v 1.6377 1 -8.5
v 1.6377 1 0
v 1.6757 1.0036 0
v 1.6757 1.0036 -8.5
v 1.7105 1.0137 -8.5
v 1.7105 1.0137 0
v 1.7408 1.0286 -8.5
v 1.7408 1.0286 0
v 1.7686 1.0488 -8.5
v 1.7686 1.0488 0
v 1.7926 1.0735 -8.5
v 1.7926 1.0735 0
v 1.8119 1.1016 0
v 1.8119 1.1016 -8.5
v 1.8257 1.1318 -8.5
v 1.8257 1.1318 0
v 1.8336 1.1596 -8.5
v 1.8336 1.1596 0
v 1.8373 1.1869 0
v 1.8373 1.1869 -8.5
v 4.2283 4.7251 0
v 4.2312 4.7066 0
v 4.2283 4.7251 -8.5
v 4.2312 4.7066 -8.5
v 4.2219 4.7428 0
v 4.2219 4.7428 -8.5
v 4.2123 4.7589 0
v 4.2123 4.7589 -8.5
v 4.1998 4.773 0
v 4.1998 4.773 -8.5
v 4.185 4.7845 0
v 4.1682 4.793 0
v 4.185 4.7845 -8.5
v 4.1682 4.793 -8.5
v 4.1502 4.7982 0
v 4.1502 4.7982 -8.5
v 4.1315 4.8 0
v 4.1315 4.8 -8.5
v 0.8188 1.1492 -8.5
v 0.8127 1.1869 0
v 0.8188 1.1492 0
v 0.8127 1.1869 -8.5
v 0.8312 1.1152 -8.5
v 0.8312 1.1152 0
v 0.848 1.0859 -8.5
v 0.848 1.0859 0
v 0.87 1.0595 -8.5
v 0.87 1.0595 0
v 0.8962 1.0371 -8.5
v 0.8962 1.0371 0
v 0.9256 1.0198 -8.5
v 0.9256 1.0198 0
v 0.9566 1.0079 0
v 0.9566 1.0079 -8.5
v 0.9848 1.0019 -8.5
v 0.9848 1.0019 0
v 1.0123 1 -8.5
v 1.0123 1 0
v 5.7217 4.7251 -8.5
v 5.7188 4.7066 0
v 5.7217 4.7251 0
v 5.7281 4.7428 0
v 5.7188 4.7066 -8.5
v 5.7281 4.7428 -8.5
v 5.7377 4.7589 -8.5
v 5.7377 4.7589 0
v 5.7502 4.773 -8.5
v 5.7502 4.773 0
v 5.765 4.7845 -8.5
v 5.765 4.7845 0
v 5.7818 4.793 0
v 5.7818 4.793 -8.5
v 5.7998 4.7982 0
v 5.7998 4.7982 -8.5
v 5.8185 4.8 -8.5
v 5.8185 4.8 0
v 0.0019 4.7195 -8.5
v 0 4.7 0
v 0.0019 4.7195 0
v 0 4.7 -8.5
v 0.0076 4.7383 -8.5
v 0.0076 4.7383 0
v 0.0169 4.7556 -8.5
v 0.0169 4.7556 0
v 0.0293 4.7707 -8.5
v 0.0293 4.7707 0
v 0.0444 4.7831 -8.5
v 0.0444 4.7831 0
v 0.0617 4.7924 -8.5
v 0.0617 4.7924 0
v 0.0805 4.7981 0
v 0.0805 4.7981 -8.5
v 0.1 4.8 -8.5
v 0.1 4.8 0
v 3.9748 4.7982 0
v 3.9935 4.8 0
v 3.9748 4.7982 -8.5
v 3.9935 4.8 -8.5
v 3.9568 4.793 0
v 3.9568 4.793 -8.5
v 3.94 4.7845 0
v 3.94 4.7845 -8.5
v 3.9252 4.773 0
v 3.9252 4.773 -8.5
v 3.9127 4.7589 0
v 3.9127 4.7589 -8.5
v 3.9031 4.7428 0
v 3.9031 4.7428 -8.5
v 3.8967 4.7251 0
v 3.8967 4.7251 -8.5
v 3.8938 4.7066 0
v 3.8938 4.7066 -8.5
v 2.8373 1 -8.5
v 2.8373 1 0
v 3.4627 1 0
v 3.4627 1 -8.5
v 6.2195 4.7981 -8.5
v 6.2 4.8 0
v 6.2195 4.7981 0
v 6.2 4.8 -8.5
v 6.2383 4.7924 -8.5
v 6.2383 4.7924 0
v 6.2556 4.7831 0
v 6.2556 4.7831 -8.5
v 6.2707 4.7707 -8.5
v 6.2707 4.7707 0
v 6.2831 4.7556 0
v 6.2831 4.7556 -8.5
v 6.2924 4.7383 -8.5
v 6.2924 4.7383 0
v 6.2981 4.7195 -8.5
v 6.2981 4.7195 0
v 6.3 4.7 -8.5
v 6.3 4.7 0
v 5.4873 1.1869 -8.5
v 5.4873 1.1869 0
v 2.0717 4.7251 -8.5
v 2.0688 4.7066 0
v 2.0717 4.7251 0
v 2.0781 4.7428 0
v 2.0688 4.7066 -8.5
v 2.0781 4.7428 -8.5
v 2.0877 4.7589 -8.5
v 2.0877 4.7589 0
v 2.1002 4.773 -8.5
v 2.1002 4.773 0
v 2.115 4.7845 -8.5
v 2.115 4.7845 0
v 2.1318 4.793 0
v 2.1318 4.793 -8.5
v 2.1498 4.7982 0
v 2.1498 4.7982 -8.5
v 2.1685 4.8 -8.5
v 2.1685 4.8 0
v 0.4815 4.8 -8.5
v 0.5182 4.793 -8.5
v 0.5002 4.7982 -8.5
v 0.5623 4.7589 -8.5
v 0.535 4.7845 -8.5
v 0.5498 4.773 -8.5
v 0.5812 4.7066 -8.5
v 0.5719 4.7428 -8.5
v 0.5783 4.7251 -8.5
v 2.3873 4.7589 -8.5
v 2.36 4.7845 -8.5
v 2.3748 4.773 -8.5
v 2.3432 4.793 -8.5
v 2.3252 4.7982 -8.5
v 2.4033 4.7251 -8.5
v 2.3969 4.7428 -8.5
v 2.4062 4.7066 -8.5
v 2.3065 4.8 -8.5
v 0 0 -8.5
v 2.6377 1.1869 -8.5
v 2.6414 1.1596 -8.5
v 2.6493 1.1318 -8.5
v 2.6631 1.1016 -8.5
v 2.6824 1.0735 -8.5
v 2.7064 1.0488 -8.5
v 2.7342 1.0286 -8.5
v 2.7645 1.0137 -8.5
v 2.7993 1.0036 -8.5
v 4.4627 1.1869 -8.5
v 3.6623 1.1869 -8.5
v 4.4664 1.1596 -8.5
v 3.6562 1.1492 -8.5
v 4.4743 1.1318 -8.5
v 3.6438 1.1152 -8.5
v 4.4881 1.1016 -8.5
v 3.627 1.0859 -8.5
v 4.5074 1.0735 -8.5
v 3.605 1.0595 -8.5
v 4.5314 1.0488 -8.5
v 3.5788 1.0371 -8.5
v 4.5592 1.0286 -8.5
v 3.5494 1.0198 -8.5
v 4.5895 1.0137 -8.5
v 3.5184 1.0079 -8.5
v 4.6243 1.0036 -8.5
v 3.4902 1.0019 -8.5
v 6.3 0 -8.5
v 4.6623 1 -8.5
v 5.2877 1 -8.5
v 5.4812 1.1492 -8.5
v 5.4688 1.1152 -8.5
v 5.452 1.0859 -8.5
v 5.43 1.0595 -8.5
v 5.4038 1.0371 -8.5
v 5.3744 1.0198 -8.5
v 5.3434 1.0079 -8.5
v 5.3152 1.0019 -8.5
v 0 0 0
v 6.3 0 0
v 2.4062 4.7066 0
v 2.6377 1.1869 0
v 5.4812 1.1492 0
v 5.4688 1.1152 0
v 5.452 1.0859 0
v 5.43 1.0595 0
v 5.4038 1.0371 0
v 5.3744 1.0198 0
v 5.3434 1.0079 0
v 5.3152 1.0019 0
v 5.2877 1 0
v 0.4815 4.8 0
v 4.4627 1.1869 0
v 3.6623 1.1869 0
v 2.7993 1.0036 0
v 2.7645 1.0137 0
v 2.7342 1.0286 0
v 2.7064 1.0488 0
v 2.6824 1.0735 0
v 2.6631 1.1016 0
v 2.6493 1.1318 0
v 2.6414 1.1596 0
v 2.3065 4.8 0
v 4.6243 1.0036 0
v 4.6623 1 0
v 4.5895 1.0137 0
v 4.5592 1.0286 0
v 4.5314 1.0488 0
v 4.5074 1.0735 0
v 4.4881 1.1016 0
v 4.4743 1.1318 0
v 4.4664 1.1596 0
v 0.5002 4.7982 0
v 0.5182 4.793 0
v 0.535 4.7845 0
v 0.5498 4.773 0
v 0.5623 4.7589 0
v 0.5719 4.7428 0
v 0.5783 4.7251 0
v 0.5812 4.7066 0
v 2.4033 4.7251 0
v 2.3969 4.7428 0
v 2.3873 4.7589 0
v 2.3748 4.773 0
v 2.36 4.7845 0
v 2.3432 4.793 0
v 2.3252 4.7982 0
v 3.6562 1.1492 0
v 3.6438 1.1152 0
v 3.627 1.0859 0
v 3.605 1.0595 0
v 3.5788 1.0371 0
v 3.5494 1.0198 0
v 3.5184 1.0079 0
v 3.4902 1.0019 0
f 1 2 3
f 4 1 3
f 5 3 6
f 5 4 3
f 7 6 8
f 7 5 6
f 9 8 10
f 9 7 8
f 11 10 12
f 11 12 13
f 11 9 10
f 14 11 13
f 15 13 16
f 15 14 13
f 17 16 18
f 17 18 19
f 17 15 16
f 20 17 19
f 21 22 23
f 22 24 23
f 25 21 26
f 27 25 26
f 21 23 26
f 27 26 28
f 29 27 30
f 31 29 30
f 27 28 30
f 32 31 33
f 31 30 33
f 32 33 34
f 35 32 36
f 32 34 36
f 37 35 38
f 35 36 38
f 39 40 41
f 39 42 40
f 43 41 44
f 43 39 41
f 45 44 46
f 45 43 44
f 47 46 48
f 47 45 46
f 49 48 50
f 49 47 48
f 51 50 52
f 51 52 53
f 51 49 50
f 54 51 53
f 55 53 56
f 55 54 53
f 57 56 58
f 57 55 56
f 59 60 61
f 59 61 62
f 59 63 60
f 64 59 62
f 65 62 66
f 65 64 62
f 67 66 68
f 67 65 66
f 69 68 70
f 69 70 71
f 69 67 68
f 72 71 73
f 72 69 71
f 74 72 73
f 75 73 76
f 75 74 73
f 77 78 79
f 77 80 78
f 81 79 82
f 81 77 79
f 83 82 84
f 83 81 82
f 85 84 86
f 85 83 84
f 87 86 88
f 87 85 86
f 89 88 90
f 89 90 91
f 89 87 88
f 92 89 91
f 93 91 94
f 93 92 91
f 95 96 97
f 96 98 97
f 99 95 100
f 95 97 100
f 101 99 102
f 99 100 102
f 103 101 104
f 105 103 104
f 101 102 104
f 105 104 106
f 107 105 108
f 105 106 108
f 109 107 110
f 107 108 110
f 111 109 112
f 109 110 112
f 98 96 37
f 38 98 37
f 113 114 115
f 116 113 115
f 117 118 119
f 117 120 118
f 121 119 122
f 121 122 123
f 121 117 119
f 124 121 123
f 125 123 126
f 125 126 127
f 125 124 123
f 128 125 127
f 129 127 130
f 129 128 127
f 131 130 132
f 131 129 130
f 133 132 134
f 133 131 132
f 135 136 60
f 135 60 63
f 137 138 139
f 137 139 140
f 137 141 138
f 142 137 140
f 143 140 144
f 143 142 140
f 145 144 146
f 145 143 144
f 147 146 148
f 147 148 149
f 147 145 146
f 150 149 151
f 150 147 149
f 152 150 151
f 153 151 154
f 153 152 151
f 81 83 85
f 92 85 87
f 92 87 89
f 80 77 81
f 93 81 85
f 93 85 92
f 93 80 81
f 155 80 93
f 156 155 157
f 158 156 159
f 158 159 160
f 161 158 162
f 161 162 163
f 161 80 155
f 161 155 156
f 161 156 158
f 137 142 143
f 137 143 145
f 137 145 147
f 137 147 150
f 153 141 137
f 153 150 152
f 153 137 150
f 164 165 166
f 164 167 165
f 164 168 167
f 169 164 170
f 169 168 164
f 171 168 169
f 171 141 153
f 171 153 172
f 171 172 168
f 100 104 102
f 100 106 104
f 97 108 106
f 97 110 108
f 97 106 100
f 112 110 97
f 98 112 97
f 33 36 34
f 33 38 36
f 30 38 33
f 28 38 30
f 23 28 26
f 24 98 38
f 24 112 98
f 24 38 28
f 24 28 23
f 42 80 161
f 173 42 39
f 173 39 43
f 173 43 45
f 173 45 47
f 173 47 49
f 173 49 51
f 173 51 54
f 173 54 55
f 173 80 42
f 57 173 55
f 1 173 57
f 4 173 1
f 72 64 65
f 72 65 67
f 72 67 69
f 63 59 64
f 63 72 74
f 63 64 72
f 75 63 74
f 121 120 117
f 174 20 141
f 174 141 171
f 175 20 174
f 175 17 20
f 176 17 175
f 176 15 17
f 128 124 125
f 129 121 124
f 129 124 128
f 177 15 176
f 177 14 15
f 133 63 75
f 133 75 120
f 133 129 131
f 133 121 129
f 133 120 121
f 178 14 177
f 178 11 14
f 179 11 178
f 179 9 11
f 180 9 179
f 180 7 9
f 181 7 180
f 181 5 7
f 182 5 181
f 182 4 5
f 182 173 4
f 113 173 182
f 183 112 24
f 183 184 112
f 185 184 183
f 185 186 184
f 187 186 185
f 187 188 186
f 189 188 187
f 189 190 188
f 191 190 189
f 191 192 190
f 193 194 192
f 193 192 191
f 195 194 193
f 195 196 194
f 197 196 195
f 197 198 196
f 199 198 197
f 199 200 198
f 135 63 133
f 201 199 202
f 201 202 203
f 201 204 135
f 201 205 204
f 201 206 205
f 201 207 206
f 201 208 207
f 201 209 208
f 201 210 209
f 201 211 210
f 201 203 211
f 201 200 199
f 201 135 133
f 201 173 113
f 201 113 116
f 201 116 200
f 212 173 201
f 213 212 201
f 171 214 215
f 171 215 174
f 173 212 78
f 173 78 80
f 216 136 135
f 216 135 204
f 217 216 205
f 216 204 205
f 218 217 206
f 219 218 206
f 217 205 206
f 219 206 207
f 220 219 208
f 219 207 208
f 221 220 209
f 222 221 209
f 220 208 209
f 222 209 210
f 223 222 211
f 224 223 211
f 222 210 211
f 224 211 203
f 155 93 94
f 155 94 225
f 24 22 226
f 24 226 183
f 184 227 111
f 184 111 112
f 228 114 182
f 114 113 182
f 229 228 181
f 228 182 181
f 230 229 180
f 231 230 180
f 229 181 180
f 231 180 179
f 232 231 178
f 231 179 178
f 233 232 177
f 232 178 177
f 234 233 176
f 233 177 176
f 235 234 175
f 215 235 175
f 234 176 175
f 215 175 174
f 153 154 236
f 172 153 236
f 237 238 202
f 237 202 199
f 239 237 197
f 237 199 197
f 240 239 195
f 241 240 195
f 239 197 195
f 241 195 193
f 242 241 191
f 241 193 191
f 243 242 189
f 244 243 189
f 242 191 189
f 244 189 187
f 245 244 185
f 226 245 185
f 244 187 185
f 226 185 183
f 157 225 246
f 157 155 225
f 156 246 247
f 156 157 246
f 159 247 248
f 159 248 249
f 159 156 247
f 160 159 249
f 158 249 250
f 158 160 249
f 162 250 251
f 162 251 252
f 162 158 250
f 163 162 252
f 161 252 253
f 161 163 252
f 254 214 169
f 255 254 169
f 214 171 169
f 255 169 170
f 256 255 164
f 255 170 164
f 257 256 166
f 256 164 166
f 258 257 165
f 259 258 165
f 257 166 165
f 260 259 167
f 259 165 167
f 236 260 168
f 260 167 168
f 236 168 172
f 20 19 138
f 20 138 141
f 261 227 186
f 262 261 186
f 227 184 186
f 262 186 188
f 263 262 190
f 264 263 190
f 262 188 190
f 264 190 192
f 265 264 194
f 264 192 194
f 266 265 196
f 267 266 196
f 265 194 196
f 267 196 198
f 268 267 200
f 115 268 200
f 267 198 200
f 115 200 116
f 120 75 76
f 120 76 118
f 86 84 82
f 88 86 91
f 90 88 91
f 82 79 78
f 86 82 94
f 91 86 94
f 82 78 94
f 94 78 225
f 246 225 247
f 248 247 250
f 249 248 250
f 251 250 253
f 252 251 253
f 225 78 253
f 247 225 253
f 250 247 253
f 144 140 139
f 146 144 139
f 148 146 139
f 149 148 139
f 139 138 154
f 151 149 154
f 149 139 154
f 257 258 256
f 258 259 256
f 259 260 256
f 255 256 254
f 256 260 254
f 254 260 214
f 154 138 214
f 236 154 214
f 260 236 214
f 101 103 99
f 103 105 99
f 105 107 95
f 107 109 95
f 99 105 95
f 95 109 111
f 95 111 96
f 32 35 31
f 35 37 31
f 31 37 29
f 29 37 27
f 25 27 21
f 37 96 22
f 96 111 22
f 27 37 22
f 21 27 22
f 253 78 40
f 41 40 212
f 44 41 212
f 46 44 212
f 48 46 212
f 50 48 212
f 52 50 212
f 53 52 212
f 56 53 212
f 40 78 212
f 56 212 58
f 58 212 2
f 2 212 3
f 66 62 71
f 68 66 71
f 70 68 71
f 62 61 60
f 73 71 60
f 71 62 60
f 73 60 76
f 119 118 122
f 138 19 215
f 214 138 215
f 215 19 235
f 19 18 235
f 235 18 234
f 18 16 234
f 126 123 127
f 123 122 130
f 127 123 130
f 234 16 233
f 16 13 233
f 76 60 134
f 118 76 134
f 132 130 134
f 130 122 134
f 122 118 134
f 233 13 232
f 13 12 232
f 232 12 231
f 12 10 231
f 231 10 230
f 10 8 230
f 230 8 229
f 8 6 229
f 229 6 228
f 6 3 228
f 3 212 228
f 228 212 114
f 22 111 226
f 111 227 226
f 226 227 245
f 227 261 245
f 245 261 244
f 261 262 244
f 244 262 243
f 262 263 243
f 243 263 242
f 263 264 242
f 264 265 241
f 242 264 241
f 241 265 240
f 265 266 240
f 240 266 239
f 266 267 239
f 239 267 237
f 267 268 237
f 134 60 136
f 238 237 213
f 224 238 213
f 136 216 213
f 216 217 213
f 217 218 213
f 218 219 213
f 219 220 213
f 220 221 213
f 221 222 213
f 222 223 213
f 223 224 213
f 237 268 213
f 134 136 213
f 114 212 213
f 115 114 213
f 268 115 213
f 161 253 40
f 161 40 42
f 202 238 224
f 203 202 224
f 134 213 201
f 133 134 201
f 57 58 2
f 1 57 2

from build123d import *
from OCP.BRepFilletAPI import BRepFilletAPI_MakeChamfer

# Parameters (mm, degrees)
SKETCH1_W           = 6.3
SKETCH1_H           = 8.5
BOSS_EXTRUDE1_DEPTH = 4.8
SKETCH2_W           = 1
SKETCH2_H           = 8.5
CUT_EXTRUDE1_DEPTH  = 3.8
CHAMFER1_SIZE       = 3.8
CHAMFER1_SIZE_2     = 0.25
FILLET1_R           = 0.2
FILLET2_R           = 0.1


with BuildPart() as part:
    # Sketch1 → Boss-Extrude1 (new body)
    with BuildSketch(Plane(origin=(0, 0, 0), x_dir=(1, 0, 0), z_dir=(0, 1, 0))):
        with Locations((3.15, 4.25)):
            Rectangle(SKETCH1_W, SKETCH1_H)
    extrude(amount=BOSS_EXTRUDE1_DEPTH)

    # Sketch2 → Cut-Extrude1 (cut)
    with BuildSketch(Plane(origin=(0, 4.8, 0), x_dir=(1, 0, 0), z_dir=(0, 1, 0))):
        with Locations((1.325, 4.25)):
            Rectangle(SKETCH2_W, SKETCH2_H)
        with Locations((3.15, 4.25)):
            Rectangle(SKETCH2_W, SKETCH2_H)
        with Locations((4.975, 4.25)):
            Rectangle(SKETCH2_W, SKETCH2_H)
    extrude(amount=-CUT_EXTRUDE1_DEPTH, mode=Mode.SUBTRACT)

    # Chamfer1
    chamfer1_edges_1 = [part.edges().sort_by_distance(p)[0] for p in [
        (0.825, 4.8, -4.25),
    ]]
    chamfer1_side_1 = [part.faces().sort_by_distance(p)[0] for p in [
        (0.825, 4.795, -4.25),
    ]]
    chamfer1_edges_2 = [part.edges().sort_by_distance(p)[0] for p in [
        (5.475, 4.8, -4.25),
    ]]
    chamfer1_side_2 = [part.faces().sort_by_distance(p)[0] for p in [
        (5.48, 4.8, -4.25),
    ]]
    chamfer1_edges_3 = [part.edges().sort_by_distance(p)[0] for p in [
        (4.475, 4.8, -4.25),
    ]]
    chamfer1_side_3 = [part.faces().sort_by_distance(p)[0] for p in [
        (4.475, 4.795, -4.25),
    ]]
    chamfer1_edges_4 = [part.edges().sort_by_distance(p)[0] for p in [
        (3.65, 4.8, -4.25),
    ]]
    chamfer1_side_4 = [part.faces().sort_by_distance(p)[0] for p in [
        (3.655, 4.8, -4.25),
    ]]
    chamfer1_edges_5 = [part.edges().sort_by_distance(p)[0] for p in [
        (2.65, 4.8, -4.25),
    ]]
    chamfer1_side_5 = [part.faces().sort_by_distance(p)[0] for p in [
        (2.65, 4.795, -4.25),
    ]]
    chamfer1_edges_6 = [part.edges().sort_by_distance(p)[0] for p in [
        (1.825, 4.8, -4.25),
    ]]
    chamfer1_side_6 = [part.faces().sort_by_distance(p)[0] for p in [
        (1.83, 4.8, -4.25),
    ]]
    chamfer1 = BRepFilletAPI_MakeChamfer(part.part.solid().wrapped)
    for e in chamfer1_edges_1:
        chamfer1.Add(CHAMFER1_SIZE - 0.0001, CHAMFER1_SIZE_2 - 0.0001, e.wrapped, chamfer1_side_1[0].wrapped)
    for e in chamfer1_edges_2:
        chamfer1.Add(CHAMFER1_SIZE_2 - 0.0001, CHAMFER1_SIZE - 0.0001, e.wrapped, chamfer1_side_2[0].wrapped)
    for e in chamfer1_edges_3:
        chamfer1.Add(CHAMFER1_SIZE - 0.0001, CHAMFER1_SIZE_2 - 0.0001, e.wrapped, chamfer1_side_3[0].wrapped)
    for e in chamfer1_edges_4:
        chamfer1.Add(CHAMFER1_SIZE_2 - 0.0001, CHAMFER1_SIZE - 0.0001, e.wrapped, chamfer1_side_4[0].wrapped)
    for e in chamfer1_edges_5:
        chamfer1.Add(CHAMFER1_SIZE - 0.0001, CHAMFER1_SIZE_2 - 0.0001, e.wrapped, chamfer1_side_5[0].wrapped)
    for e in chamfer1_edges_6:
        chamfer1.Add(CHAMFER1_SIZE_2 - 0.0001, CHAMFER1_SIZE - 0.0001, e.wrapped, chamfer1_side_6[0].wrapped)
    add(Compound.cast(chamfer1.Shape()), mode=Mode.REPLACE)  # a hair under: the kernel refuses the full size

    # Fillet1
    fillet1_edges = [part.edges().sort_by_distance(p)[0] for p in [
        (0.825, 1, -4.25),
        (1.825, 1, -4.25),
        (2.65, 1, -4.25),
        (3.65, 1, -4.25),
        (4.475, 1, -4.25),
        (5.475, 1, -4.25),
    ]]
    fillet(fillet1_edges, radius=FILLET1_R)

    # Fillet2
    fillet2_edges = [part.edges().sort_by_distance(p)[0] for p in [
        (6.3, 4.8, -4.25),
        (0, 4.8, -4.25),
        (5.7249, 4.8, -4.25),
        (3.8999, 4.8, -4.25),
        (4.2251, 4.8, -4.25),
        (2.0749, 4.8, -4.25),
        (2.4001, 4.8, -4.25),
        (0.5751, 4.8, -4.25),
    ]]
    fillet(fillet2_edges, radius=FILLET2_R)


solid = part.part
